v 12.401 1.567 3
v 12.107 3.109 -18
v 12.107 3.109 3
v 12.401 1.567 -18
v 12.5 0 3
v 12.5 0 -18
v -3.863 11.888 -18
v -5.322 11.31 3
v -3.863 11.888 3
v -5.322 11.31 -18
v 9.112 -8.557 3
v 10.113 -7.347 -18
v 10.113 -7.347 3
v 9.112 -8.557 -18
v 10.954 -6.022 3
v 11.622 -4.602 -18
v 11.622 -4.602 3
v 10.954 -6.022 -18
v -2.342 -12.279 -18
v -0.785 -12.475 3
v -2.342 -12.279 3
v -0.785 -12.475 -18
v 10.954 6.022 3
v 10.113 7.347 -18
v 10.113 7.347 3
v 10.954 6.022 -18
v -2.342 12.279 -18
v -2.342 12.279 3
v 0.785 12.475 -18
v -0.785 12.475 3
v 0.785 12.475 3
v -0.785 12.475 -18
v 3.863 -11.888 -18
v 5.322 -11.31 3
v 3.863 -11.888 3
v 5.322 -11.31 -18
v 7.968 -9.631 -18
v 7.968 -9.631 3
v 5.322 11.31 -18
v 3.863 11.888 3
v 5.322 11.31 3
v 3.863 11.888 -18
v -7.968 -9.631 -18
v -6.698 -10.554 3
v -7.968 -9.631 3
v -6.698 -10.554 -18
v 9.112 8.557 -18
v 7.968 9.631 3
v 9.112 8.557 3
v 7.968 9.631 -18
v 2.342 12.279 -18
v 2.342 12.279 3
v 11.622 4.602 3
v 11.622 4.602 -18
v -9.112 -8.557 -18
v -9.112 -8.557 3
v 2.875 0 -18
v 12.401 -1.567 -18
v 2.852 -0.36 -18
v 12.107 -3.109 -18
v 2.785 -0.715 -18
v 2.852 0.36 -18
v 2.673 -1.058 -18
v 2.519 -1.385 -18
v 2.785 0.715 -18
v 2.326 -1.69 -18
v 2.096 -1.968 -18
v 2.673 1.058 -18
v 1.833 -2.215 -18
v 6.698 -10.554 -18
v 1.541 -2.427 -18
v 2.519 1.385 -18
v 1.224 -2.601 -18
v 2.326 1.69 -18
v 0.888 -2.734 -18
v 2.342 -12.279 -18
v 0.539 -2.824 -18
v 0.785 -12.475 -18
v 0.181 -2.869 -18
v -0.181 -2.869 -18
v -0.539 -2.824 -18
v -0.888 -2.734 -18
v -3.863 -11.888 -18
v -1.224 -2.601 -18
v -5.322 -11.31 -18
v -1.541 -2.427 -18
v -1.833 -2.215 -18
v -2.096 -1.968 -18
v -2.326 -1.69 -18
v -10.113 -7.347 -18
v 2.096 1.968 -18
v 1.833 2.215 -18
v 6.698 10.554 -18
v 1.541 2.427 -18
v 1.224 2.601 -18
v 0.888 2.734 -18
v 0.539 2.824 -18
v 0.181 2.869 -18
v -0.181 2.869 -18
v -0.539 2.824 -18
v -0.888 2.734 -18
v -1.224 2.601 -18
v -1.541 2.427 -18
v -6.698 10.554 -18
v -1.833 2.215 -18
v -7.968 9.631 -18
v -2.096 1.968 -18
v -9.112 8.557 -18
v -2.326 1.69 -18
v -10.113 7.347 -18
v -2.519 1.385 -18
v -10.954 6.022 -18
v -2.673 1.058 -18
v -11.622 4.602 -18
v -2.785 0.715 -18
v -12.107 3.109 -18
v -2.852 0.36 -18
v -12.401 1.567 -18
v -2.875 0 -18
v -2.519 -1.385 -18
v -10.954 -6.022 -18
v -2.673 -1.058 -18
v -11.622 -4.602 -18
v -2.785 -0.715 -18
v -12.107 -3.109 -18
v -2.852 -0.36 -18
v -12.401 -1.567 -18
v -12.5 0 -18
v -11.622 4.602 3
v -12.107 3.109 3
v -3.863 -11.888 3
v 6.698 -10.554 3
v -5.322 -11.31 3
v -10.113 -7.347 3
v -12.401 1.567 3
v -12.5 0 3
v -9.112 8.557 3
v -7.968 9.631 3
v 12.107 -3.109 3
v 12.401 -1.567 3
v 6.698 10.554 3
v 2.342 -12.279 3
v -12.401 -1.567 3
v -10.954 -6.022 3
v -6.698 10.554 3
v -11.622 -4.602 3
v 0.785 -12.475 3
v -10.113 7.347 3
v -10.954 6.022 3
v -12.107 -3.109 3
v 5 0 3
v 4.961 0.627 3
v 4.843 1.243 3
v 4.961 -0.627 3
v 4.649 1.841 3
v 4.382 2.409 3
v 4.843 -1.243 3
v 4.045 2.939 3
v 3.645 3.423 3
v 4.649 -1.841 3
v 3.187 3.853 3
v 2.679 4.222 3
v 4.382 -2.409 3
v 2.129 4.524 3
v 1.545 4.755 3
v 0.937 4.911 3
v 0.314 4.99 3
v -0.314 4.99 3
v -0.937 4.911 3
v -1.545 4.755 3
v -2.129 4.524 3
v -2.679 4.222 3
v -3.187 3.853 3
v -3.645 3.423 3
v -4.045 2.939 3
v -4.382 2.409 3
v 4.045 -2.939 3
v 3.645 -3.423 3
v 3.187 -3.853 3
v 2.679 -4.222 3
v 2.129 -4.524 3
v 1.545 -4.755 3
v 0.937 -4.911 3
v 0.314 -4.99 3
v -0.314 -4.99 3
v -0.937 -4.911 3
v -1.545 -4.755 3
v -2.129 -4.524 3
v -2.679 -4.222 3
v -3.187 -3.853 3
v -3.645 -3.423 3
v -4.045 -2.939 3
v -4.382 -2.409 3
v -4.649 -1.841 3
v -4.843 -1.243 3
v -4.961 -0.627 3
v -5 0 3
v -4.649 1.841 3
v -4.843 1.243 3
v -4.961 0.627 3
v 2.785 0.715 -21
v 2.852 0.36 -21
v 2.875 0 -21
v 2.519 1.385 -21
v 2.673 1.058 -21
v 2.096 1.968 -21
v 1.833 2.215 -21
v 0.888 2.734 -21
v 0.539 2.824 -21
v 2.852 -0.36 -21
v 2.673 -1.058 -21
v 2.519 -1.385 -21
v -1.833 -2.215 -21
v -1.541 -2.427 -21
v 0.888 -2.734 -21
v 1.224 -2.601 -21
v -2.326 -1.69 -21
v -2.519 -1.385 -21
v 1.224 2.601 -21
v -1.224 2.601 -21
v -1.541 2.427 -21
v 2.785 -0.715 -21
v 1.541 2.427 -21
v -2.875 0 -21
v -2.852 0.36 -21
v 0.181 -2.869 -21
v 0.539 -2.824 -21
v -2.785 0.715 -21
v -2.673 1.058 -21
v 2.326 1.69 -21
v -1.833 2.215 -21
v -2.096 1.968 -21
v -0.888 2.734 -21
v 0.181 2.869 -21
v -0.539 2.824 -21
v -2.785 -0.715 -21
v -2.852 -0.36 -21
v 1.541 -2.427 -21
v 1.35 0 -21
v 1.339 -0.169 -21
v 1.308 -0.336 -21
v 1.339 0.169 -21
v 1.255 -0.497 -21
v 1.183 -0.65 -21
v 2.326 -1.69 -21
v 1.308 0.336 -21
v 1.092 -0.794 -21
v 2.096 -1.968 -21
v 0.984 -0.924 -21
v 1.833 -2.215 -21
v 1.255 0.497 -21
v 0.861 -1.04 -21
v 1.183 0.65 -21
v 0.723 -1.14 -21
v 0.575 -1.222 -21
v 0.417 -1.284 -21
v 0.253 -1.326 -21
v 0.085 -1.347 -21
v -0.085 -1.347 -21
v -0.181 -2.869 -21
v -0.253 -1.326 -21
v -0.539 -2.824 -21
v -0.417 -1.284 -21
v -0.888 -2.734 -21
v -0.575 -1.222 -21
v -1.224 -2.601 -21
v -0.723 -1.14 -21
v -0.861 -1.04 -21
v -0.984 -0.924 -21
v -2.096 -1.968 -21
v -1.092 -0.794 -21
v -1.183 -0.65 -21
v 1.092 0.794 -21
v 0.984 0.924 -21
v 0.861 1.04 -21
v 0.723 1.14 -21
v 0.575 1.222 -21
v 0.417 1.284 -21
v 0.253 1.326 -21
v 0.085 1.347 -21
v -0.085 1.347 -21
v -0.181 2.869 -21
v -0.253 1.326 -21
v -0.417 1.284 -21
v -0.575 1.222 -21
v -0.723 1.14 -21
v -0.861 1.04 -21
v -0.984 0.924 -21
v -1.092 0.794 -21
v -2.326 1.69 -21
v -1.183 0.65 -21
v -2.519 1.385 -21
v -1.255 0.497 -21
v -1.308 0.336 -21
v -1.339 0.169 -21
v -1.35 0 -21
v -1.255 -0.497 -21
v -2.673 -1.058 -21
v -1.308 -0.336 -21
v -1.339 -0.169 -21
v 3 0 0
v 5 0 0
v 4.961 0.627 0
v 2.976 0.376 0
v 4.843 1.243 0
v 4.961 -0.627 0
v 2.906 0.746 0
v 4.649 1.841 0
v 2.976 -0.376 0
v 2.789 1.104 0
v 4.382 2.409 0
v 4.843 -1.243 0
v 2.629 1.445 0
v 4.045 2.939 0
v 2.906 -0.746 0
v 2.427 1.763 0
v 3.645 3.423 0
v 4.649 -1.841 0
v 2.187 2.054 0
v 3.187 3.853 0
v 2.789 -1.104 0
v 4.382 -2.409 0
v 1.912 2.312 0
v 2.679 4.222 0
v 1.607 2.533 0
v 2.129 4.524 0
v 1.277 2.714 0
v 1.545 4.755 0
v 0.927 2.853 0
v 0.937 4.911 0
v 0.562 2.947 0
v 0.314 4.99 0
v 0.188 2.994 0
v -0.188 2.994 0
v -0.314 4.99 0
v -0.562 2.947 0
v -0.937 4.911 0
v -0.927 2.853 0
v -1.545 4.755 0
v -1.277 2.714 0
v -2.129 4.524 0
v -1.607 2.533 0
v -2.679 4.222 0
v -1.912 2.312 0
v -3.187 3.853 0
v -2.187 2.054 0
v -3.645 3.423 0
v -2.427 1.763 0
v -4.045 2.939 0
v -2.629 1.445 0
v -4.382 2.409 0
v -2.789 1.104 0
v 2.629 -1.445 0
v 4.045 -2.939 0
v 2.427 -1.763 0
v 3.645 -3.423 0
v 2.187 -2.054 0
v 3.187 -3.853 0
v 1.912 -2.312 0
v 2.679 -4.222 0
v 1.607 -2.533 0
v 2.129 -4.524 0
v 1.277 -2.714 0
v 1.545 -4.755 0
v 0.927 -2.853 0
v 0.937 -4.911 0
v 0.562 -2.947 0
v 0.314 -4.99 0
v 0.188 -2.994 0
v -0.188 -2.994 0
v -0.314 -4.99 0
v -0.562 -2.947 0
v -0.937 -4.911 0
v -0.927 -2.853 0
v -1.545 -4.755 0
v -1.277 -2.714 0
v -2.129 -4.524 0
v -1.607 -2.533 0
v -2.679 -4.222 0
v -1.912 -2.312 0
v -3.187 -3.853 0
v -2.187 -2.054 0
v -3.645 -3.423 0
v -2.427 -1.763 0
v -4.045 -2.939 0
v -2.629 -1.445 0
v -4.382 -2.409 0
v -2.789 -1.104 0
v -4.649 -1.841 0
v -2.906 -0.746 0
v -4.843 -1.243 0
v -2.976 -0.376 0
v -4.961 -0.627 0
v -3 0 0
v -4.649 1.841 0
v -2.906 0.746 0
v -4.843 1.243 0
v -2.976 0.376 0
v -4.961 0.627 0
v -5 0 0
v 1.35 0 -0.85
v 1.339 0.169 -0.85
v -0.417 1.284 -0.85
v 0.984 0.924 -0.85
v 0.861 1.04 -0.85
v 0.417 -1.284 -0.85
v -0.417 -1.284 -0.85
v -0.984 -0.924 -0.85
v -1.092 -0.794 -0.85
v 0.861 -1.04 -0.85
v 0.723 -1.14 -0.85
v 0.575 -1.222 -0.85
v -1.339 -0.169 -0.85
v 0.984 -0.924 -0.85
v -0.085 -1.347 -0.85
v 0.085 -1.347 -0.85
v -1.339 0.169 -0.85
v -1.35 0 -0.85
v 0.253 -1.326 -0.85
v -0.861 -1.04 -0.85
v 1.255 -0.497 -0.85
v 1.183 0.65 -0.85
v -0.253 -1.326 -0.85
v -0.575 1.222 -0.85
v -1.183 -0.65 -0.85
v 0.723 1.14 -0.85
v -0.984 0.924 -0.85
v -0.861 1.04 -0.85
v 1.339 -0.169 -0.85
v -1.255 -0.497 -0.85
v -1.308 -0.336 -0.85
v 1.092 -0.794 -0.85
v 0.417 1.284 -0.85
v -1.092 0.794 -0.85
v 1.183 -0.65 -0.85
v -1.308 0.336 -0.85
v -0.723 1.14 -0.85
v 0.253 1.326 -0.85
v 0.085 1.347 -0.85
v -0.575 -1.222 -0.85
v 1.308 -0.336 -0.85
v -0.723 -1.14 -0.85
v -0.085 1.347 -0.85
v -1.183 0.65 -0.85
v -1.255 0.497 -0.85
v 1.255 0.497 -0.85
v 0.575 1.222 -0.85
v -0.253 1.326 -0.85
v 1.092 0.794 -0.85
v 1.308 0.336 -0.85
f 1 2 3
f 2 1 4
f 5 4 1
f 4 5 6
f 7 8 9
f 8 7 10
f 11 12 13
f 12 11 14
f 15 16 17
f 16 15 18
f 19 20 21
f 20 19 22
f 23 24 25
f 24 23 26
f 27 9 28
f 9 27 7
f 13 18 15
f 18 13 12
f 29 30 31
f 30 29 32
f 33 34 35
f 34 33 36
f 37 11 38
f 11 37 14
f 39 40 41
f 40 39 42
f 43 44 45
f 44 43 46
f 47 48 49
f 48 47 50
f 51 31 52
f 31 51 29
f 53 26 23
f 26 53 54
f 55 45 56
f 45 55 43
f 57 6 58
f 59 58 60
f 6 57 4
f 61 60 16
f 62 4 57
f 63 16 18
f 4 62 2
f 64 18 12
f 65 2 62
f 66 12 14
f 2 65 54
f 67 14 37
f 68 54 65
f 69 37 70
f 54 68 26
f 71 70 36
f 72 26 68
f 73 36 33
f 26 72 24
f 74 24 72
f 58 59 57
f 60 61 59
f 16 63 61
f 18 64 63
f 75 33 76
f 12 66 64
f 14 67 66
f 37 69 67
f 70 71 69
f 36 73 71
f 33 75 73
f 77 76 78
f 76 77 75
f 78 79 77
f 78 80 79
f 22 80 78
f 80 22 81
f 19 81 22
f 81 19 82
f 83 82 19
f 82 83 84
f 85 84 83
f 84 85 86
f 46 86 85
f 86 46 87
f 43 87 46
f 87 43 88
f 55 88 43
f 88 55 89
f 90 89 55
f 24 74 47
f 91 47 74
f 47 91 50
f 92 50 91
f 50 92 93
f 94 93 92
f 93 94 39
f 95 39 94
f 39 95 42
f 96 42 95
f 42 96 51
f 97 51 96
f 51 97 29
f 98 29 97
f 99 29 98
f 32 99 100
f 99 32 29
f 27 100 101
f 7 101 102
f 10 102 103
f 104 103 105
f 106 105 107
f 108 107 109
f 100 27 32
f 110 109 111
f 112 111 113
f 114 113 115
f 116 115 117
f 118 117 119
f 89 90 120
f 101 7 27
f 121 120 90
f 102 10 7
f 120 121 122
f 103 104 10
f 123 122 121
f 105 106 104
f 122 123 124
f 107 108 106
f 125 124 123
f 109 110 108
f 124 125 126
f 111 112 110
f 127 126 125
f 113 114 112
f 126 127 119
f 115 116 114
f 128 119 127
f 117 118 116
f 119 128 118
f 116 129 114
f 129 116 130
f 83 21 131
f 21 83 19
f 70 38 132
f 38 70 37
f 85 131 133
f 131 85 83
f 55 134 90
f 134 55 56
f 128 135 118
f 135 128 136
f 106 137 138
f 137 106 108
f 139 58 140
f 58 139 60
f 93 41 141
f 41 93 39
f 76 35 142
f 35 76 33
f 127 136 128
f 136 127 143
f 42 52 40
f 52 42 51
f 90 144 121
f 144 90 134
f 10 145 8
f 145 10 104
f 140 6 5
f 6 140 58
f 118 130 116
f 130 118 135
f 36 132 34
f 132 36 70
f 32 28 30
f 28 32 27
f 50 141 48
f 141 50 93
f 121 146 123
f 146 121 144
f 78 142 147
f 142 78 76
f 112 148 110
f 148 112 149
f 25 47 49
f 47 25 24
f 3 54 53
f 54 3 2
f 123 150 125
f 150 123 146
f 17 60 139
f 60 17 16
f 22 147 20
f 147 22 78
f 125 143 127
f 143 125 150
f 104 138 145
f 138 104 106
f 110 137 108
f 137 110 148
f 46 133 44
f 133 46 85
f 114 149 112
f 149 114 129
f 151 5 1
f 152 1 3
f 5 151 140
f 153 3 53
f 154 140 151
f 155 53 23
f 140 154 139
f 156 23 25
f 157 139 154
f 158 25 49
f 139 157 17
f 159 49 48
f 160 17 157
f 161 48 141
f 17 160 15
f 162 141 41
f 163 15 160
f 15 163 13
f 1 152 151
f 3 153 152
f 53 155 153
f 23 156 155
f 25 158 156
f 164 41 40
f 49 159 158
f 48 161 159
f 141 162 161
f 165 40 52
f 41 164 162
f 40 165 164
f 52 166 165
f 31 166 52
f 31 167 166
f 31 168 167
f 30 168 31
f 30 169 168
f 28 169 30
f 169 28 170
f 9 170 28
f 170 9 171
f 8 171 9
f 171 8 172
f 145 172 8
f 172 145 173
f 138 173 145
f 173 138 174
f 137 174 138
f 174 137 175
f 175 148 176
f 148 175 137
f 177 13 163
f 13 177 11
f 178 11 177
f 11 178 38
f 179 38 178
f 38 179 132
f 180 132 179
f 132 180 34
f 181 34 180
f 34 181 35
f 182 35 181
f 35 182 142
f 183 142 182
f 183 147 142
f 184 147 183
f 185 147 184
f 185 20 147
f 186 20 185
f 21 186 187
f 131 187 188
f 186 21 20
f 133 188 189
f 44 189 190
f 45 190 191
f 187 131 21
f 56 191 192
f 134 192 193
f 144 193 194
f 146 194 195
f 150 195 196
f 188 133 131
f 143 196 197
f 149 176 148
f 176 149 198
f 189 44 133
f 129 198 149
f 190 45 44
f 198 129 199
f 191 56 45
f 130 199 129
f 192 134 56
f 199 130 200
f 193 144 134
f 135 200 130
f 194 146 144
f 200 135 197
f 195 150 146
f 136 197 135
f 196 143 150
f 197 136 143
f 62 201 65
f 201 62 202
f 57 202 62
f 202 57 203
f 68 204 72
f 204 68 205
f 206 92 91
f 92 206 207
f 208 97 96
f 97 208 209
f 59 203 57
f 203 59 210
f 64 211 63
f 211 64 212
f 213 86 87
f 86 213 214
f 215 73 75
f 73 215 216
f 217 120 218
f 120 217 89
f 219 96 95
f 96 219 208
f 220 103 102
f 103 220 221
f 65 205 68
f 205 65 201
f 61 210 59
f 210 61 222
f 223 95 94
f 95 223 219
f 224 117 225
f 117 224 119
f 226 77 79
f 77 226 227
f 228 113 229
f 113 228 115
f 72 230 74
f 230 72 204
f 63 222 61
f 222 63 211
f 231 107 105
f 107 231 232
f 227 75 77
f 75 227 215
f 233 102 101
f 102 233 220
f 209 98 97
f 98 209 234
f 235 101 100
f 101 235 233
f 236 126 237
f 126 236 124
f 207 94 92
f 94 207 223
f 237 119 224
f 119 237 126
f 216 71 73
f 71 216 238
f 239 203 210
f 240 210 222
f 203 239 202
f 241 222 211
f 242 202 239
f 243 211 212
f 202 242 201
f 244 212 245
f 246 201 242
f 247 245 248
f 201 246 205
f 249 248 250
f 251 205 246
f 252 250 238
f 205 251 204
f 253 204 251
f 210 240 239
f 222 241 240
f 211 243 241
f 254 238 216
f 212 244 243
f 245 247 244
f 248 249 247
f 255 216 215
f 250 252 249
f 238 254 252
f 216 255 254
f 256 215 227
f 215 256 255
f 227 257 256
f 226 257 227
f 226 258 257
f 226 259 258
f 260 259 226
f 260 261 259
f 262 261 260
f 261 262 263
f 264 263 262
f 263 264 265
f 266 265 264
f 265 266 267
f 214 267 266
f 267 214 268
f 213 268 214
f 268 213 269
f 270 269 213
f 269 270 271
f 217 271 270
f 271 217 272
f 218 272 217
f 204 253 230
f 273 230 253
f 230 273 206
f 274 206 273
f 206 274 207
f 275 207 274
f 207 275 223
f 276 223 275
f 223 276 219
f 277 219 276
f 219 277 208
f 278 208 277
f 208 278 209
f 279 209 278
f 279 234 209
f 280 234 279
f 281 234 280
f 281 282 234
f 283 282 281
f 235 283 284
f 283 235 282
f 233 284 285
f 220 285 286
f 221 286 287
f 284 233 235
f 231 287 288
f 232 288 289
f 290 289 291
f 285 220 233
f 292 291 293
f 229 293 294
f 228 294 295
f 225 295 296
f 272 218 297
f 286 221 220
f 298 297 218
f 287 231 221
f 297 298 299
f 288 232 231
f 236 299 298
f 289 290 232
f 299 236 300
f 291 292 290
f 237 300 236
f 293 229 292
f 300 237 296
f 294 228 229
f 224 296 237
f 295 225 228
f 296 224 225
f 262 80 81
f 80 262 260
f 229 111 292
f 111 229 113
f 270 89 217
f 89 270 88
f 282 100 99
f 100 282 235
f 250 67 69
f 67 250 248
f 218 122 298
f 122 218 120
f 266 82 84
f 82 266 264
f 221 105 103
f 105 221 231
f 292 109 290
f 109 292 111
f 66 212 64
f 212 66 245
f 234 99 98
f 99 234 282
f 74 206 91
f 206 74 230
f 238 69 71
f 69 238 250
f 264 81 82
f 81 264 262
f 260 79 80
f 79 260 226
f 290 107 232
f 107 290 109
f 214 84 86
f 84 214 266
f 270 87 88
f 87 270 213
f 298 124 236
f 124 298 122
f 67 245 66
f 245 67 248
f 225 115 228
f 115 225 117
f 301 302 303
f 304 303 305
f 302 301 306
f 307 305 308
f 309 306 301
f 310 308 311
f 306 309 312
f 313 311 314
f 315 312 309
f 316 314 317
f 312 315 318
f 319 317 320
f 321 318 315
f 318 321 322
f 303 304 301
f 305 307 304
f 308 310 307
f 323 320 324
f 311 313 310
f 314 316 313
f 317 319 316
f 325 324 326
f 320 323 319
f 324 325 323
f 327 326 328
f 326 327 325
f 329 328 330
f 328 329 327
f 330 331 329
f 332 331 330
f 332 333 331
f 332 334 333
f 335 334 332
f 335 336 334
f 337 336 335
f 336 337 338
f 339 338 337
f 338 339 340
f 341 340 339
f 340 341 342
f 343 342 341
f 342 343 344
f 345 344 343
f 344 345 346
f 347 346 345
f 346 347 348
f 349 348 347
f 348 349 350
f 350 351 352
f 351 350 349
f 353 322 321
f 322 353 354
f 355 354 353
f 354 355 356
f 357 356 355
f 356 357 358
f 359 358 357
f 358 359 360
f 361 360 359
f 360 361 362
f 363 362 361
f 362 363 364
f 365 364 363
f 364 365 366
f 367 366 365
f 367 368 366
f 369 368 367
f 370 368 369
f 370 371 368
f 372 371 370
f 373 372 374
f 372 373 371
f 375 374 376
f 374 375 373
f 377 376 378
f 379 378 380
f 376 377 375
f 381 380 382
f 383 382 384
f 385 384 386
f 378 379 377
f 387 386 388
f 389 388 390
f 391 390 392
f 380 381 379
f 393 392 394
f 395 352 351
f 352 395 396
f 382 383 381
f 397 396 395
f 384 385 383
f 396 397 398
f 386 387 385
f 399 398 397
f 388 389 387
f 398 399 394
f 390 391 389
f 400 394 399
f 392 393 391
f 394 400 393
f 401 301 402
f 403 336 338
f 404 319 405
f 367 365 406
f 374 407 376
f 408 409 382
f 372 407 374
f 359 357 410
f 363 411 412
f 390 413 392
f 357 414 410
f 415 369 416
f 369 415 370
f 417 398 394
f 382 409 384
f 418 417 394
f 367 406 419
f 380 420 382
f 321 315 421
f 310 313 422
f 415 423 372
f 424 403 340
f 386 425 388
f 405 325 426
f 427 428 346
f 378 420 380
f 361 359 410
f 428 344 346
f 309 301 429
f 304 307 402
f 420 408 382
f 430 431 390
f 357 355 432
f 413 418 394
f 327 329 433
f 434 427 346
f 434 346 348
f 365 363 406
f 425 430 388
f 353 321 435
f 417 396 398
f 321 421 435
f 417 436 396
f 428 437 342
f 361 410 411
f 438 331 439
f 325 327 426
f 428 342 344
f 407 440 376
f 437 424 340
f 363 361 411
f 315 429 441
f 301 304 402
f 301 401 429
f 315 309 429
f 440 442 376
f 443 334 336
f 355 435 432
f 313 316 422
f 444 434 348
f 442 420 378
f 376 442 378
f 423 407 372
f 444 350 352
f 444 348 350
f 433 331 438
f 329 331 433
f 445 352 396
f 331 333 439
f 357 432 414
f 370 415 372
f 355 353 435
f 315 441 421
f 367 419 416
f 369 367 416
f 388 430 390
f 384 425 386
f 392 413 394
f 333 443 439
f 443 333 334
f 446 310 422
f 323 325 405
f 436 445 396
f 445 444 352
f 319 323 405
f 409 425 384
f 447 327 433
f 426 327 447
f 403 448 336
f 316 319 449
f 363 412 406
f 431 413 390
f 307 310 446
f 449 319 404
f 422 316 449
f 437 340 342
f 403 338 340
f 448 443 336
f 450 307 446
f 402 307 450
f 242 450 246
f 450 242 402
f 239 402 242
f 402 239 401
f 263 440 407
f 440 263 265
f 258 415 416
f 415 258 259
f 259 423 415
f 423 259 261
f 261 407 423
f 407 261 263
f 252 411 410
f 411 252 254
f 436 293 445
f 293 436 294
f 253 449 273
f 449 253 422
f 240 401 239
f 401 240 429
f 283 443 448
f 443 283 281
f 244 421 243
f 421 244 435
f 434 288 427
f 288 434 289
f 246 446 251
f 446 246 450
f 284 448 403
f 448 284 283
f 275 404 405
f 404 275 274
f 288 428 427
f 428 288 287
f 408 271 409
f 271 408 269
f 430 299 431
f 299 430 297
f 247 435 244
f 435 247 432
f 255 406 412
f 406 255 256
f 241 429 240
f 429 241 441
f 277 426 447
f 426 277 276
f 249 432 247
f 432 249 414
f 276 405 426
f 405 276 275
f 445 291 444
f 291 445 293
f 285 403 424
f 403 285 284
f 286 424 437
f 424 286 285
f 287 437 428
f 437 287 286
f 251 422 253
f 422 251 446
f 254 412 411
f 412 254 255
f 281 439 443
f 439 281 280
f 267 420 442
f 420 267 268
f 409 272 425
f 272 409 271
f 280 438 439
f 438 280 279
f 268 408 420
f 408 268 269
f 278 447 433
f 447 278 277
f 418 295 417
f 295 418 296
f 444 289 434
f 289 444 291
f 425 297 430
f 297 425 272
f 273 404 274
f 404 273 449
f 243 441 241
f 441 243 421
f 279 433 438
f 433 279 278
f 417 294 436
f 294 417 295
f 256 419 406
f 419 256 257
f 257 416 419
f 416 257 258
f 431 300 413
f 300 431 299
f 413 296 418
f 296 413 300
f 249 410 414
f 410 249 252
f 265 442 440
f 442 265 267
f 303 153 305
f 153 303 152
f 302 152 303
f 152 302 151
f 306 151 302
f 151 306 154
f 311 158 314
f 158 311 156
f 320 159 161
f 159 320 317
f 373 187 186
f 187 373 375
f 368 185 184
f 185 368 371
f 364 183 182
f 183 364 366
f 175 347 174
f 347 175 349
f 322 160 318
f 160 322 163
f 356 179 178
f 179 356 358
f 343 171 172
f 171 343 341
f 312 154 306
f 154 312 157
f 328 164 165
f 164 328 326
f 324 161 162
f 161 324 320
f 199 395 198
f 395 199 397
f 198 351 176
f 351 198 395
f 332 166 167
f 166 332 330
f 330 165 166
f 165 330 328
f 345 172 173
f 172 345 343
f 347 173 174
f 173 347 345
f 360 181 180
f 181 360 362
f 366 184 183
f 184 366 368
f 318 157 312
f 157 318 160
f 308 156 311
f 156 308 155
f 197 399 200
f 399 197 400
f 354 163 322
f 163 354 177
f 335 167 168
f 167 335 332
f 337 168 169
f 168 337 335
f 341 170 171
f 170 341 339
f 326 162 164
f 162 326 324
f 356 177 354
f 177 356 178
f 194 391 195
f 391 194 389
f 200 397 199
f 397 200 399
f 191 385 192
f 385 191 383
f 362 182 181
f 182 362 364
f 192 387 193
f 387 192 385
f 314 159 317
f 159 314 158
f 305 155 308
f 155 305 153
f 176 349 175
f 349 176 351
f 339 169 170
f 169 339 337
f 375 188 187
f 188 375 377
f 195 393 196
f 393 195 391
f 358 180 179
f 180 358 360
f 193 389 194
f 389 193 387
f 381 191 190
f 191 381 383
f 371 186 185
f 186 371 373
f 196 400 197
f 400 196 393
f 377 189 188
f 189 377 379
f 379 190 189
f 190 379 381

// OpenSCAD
$fn = 50;

difference() {
	union() {
		translate(v = [0, 0, -18.0]) {
			cylinder(h = 21, r = 12.5);
		}
		#translate(v = [0, 0, -21.0]) {
			cylinder(h = 21, r = 2.875);
		}
	}
	union() {
		translate(v = [0, 0, 0]) {
			rotate(a = [0, 0, 0]) {
				difference() {
					union() {
						translate(v = [0, 0, -21.0]) {
							cylinder(h = 21, r = 1.0);
						}
						translate(v = [0, 0, -0.85]) {
							cylinder(h = 0.85, r1 = 1.35, r2 = 3.0);
						}
						translate(v = [0, 0, -21.0]) {
							cylinder(h = 21, r = 1.35);
						}
						translate(v = [0, 0, -21.0]) {
							cylinder(h = 21, r = 1.0);
						}
					}
					union();
				}
			}
		}
		#cylinder(h = 3, r = 5.0);
	}
}
